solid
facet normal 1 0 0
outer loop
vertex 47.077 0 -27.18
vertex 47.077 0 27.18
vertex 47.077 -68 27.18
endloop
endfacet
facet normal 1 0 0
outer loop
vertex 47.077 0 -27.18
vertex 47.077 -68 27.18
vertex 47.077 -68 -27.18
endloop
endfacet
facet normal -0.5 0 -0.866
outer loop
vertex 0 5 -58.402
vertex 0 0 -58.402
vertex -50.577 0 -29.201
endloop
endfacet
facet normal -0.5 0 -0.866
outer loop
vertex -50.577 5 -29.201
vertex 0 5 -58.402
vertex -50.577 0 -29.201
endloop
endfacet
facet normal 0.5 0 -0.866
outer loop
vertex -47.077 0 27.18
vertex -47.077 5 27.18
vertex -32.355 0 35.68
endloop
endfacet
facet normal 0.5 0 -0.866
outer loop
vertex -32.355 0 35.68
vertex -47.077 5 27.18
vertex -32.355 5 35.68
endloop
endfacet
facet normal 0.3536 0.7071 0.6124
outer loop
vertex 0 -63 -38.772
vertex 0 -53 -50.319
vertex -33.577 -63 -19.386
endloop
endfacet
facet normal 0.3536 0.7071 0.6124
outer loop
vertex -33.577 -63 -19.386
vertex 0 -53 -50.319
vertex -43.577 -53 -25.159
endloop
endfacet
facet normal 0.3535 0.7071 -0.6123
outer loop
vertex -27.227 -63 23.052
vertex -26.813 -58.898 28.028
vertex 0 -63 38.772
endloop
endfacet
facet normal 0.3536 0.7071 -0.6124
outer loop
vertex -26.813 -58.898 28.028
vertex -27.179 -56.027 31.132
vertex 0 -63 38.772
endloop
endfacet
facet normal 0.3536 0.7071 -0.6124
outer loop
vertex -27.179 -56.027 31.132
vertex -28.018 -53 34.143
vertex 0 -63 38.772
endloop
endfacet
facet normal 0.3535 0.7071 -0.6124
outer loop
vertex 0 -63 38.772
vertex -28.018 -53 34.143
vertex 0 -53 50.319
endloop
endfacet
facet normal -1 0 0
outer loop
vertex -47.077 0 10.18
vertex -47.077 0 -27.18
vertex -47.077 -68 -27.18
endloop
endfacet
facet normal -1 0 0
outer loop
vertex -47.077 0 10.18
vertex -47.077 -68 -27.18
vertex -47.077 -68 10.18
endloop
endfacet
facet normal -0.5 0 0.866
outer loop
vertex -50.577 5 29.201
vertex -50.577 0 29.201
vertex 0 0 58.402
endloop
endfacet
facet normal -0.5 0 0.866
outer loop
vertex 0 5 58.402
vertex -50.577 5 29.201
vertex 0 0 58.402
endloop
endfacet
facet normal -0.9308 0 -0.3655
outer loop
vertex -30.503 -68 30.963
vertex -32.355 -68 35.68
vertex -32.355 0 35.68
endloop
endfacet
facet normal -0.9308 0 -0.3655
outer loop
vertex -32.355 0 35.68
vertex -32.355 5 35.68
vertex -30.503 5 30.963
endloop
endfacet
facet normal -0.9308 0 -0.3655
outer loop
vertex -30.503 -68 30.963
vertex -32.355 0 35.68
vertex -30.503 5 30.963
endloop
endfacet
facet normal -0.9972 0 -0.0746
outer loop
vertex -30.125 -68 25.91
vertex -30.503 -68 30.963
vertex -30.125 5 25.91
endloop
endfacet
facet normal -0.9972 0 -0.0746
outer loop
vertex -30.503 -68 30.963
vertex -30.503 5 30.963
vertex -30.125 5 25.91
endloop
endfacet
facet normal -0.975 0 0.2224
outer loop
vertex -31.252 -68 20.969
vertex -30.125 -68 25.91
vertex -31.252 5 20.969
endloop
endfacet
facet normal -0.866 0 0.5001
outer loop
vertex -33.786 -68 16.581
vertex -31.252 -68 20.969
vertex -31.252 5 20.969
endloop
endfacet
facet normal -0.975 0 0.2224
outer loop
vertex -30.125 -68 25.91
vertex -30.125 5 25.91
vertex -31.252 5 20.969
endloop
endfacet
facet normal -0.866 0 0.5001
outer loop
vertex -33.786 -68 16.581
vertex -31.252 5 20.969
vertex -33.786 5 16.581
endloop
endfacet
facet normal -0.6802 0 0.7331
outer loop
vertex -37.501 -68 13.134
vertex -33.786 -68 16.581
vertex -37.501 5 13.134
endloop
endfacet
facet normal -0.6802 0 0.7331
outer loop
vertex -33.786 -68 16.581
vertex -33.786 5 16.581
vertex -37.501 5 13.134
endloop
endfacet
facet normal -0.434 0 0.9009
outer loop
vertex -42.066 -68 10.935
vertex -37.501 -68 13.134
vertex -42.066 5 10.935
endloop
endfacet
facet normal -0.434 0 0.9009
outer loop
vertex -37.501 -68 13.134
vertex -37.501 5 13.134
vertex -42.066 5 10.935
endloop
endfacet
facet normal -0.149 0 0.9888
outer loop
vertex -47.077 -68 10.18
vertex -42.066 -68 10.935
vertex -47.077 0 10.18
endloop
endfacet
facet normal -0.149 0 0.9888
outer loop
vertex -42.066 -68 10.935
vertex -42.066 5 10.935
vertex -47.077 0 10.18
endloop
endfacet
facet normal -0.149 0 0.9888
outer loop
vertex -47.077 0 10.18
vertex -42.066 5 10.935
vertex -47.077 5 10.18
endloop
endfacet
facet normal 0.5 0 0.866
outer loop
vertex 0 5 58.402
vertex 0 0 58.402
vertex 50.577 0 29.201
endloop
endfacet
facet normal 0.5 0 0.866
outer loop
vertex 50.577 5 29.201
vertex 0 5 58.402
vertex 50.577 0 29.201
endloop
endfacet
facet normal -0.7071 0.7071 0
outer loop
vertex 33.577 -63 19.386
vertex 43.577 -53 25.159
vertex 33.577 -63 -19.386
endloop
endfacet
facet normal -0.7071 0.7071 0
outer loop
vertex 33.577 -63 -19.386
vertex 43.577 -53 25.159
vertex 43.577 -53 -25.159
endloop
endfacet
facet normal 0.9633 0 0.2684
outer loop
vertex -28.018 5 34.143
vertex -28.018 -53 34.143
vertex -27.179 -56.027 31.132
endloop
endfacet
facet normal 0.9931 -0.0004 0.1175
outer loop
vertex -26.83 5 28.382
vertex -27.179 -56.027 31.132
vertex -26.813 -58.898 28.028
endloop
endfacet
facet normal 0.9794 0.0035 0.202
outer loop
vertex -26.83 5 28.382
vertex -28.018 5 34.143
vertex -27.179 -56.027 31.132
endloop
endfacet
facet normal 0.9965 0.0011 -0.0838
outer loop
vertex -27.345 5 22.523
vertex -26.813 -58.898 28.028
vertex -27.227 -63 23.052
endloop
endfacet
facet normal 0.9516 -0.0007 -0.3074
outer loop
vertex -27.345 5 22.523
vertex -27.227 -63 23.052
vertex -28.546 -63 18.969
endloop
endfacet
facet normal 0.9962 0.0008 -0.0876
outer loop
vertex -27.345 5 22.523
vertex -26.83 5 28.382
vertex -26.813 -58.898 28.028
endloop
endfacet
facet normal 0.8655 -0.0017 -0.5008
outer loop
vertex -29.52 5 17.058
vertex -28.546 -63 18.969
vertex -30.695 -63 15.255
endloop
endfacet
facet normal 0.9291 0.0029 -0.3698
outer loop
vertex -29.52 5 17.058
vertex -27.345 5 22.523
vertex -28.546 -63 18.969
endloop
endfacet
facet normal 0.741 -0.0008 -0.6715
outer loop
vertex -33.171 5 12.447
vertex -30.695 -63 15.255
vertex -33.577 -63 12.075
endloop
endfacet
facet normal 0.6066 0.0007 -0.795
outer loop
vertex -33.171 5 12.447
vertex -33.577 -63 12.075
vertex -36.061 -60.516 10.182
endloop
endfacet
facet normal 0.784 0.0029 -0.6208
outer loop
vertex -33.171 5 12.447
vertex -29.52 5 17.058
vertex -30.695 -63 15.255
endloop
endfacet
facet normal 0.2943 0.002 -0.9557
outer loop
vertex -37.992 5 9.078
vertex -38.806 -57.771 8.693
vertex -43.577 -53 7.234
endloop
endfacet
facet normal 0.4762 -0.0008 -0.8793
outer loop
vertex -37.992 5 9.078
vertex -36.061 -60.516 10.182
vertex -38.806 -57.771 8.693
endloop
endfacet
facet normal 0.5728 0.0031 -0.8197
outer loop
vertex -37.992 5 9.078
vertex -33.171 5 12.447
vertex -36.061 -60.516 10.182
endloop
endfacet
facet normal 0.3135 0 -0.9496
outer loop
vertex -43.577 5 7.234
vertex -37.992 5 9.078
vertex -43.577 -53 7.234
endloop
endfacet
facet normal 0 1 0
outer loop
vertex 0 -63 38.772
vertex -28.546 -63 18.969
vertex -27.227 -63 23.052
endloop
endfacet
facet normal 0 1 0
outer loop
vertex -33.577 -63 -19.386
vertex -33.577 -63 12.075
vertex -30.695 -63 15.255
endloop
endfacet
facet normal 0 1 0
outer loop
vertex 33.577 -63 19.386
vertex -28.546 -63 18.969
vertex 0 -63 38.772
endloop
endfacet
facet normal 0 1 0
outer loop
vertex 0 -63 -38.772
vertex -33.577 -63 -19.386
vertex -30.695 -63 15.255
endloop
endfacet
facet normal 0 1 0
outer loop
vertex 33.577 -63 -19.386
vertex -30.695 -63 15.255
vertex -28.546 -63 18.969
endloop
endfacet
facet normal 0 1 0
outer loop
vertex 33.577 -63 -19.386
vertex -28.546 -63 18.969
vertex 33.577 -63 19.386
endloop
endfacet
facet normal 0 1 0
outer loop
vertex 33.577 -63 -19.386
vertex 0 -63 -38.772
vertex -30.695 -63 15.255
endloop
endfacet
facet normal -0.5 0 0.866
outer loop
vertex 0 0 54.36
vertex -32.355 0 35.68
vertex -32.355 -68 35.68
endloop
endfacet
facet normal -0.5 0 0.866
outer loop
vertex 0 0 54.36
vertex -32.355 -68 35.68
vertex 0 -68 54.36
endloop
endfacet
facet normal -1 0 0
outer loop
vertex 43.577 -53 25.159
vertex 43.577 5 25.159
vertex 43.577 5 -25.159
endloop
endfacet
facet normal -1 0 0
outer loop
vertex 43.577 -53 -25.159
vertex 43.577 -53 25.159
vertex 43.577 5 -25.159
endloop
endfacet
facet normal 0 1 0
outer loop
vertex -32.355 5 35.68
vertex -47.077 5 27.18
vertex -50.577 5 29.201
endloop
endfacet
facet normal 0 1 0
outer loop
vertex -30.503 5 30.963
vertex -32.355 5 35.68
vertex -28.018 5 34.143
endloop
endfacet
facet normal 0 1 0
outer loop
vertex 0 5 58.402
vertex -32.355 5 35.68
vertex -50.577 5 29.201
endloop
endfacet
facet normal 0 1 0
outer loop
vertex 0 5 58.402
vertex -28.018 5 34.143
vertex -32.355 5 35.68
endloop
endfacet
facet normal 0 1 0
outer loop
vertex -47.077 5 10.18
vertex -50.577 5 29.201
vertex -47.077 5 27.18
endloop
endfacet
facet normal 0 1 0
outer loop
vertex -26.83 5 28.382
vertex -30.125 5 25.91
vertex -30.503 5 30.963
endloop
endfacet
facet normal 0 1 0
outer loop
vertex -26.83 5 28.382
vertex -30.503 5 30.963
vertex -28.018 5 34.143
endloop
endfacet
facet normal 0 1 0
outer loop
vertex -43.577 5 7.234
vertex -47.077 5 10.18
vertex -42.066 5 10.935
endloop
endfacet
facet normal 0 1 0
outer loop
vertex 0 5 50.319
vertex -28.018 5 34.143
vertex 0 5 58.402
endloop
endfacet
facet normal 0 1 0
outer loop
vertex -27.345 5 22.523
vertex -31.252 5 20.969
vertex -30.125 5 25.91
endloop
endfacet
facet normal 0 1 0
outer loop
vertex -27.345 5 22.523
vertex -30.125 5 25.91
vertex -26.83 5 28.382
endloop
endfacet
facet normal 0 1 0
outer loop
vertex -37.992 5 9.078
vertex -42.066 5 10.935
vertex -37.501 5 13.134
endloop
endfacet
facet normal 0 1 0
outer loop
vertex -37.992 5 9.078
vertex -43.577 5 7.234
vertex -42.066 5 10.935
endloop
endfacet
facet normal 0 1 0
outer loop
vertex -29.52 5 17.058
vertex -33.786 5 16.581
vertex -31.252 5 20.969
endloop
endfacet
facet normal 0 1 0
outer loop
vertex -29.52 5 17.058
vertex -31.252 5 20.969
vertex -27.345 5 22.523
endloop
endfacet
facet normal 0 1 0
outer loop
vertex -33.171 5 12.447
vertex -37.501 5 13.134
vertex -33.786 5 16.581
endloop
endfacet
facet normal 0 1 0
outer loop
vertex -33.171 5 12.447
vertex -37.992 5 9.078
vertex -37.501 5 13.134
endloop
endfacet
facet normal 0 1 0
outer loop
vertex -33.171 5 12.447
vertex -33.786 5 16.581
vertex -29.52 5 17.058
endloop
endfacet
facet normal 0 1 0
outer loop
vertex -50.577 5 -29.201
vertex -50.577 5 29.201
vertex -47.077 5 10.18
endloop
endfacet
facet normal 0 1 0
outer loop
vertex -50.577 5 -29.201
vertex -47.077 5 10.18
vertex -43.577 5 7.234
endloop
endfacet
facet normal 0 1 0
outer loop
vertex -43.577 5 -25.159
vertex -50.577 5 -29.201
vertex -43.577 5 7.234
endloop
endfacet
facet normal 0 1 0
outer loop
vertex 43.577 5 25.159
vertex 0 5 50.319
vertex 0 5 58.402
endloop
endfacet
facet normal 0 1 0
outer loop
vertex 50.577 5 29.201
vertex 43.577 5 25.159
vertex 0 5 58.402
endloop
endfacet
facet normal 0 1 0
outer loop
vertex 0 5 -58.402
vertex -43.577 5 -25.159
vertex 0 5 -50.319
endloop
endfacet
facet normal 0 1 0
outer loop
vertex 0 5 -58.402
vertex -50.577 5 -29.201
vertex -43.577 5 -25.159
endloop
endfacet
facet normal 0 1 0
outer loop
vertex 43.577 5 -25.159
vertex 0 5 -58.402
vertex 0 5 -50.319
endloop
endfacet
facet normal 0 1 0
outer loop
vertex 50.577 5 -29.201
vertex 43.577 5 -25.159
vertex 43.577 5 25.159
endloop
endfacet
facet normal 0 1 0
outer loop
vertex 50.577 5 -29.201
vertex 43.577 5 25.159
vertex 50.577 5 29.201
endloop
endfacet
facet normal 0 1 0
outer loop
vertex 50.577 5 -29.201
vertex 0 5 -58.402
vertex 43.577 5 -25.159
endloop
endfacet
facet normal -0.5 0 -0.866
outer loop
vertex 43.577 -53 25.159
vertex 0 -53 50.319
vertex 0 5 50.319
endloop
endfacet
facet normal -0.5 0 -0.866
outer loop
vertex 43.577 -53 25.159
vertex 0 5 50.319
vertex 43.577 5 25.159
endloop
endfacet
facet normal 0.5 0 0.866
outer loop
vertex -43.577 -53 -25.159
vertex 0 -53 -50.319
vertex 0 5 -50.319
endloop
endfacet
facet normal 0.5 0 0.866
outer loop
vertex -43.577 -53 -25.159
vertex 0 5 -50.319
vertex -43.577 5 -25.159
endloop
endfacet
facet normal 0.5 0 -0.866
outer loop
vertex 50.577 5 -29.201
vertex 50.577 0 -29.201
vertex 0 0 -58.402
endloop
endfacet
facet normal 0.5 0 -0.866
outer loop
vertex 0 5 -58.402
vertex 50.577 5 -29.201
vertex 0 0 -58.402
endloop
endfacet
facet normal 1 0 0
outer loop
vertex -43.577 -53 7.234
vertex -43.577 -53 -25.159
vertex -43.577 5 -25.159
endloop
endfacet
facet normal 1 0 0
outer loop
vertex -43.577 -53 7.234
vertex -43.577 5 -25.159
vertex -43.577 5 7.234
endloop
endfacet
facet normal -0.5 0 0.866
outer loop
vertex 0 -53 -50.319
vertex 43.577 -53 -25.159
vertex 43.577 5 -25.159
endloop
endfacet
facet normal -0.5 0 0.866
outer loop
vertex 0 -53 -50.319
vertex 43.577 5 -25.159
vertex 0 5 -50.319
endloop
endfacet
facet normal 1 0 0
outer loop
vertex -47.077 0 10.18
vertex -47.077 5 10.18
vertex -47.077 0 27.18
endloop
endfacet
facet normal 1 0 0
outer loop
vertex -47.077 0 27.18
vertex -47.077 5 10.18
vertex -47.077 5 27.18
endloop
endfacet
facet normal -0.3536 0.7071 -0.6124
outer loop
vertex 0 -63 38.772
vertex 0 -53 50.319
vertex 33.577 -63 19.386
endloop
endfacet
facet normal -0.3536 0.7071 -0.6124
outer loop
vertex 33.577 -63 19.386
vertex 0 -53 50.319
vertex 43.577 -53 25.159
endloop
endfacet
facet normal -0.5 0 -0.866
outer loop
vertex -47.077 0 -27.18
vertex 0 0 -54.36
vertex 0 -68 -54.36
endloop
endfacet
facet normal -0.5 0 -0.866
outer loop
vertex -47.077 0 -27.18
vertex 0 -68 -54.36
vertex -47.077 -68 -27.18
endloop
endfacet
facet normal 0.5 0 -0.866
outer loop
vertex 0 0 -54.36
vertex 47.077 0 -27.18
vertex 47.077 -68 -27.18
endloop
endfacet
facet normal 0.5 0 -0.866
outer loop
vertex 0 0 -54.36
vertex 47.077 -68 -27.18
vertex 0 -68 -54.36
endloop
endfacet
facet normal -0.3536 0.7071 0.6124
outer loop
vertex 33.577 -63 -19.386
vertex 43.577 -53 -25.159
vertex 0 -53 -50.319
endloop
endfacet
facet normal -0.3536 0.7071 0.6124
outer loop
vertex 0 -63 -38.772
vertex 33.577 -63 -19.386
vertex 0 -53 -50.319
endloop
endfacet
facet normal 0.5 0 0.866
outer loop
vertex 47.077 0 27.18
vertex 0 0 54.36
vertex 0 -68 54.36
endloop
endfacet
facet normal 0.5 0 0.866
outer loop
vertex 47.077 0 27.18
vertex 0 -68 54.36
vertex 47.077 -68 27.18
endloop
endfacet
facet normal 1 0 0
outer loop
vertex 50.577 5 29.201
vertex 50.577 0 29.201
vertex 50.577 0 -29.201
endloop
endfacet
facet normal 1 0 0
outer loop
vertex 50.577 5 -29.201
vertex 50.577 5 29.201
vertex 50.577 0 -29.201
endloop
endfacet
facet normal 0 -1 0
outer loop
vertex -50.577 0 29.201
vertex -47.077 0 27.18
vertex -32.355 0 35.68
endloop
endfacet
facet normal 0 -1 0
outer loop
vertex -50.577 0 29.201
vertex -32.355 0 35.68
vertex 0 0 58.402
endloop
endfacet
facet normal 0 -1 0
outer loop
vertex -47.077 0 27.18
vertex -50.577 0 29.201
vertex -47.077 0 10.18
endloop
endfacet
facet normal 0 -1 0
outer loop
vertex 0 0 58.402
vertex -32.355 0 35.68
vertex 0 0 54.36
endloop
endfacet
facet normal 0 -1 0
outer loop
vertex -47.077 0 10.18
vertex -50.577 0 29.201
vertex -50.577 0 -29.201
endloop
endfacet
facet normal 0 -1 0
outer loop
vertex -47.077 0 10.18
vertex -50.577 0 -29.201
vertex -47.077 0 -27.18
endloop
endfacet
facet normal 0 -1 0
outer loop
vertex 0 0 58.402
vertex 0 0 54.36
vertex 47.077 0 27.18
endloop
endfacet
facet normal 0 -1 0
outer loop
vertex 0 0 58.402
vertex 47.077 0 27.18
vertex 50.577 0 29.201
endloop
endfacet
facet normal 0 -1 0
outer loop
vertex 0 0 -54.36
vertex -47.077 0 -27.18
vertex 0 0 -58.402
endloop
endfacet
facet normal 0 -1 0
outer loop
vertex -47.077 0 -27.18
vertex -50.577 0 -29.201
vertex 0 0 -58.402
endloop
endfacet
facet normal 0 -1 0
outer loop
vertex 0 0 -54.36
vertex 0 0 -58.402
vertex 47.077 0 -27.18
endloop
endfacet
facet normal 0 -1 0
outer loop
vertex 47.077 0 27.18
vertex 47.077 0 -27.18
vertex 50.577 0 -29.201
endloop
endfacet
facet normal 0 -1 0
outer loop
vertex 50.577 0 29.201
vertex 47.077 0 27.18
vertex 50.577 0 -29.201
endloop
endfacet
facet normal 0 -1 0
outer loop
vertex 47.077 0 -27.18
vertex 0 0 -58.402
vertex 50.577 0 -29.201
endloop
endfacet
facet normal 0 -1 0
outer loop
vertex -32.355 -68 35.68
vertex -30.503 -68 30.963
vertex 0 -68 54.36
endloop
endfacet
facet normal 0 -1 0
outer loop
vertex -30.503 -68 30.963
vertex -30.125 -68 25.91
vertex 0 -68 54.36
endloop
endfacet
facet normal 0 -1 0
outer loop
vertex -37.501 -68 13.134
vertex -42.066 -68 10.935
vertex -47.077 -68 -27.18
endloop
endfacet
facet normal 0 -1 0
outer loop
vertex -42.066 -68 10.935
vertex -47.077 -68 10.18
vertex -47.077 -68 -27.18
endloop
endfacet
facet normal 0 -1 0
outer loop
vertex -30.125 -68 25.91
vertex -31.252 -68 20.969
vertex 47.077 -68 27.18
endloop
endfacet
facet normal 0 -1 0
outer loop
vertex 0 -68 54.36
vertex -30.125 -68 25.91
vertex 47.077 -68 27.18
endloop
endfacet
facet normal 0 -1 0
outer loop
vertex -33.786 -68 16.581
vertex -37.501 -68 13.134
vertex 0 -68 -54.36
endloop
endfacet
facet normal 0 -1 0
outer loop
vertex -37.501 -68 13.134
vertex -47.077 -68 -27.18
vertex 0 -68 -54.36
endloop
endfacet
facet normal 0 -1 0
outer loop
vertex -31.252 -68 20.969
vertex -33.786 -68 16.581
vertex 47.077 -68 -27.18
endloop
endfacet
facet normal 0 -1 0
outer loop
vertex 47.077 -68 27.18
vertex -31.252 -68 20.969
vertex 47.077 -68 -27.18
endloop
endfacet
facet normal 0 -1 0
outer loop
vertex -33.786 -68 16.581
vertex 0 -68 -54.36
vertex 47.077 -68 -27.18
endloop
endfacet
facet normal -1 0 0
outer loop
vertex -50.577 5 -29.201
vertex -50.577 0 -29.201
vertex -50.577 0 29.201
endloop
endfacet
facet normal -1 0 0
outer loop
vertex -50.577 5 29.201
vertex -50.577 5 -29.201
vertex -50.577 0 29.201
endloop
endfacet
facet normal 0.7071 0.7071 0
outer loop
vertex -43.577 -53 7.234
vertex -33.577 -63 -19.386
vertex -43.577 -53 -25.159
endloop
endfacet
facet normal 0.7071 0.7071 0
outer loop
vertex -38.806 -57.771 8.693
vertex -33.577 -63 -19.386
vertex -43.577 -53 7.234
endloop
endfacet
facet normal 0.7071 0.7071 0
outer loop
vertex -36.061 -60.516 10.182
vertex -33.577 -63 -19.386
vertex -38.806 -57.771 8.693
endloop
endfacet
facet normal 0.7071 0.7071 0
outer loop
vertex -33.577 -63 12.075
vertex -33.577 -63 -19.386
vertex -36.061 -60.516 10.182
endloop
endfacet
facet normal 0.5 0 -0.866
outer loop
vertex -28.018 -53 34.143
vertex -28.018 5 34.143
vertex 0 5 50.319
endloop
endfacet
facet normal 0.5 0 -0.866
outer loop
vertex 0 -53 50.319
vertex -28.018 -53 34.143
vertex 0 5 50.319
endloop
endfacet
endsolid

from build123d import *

# Parameters (mm, degrees)
BOSS_EXTRUDE1_DEPTH = 5
BOSS_EXTRUDE2_DEPTH = 73
CUT_EXTRUDE1_DEPTH  = 68
BOSS_EXTRUDE3_DEPTH = 73
CUT_EXTRUDE3_DEPTH  = 73
CHAMFER1_SIZE       = 10


with BuildPart() as part:
    # Sketch3 → Boss-Extrude1 (new body)
    with BuildSketch(Plane(origin=(0, 0, 0), x_dir=(1, 0, 0), z_dir=(0, 1, 0))):
        Polygon((50.577269222, -29.2008), (50.577269222, 29.2008), (0, 58.4016), (-50.577269222, 29.2008), (-50.577269222, -29.2008), (0, -58.4016), align=None)
        Polygon((43.577269222, -25.159348116), (43.577269222, 25.159348116), (0, 50.318696231), (-43.577269222, 25.159348116), (-43.577269222, -25.159348116), (0, -50.318696231), align=None, mode=Mode.SUBTRACT)
    extrude(amount=BOSS_EXTRUDE1_DEPTH)

    # Sketch4 → Boss-Extrude2 (add)
    with BuildSketch(Plane(origin=(0, 5, 0), x_dir=(1, 0, 0), z_dir=(0, 1, 0))):
        Polygon((47.077269222, -27.180074058), (47.077269222, 27.180074058), (0, 54.360148116), (-47.077269222, 27.180074058), (-47.077269222, -27.180074058), (0, -54.360148116), align=None)
    extrude(amount=-BOSS_EXTRUDE2_DEPTH)

    # Sketch5 → Cut-Extrude1 (cut)
    with BuildSketch(Plane(origin=(0, 5, 0), x_dir=(1, 0, 0), z_dir=(0, 1, 0))):
        Polygon((43.577269222, -25.159348116), (43.577269222, 25.159348116), (0, 50.318696231), (-43.577269222, 25.159348116), (-43.577269222, -25.159348116), (0, -50.318696231), align=None)
    extrude(amount=-CUT_EXTRUDE1_DEPTH, mode=Mode.SUBTRACT)

    # Sketch6 → Boss-Extrude3 (add)
    with BuildSketch(Plane(origin=(0, 5, 0), x_dir=(1, 0, 0), z_dir=(0, 1, 0))):
        with BuildLine():
            ThreePointArc((-28.017982948, -34.142506234), (-29.520182072, -17.058341723), (-43.577269222, -7.233700248))
            Line((-43.577269222, -7.233700248), (-43.577269222, -25.159348116))
            Line((-43.577269222, -25.159348116), (-28.017982948, -34.142506234))
        make_face()
    extrude(amount=-BOSS_EXTRUDE3_DEPTH)

    # Sketch9 → Cut-Extrude3 (cut)
    with BuildSketch(Plane(origin=(0, 5, 0), x_dir=(1, 0, 0), z_dir=(0, 1, 0))):
        with BuildLine():
            Line((-47.077269222, -10.180074058), (-47.077269222, -27.180074058))
            Line((-47.077269222, -27.180074058), (-32.354837357, -35.680074058))
            ThreePointArc((-32.354837357, -35.680074058), (-32.354837357, -18.680074058), (-47.077269222, -10.180074058))
        make_face()
    extrude(amount=-CUT_EXTRUDE3_DEPTH, mode=Mode.SUBTRACT)

    # Chamfer1
    chamfer1_edges = [part.edges().sort_by_distance(p)[0] for p in [
        (21.788634611, -63, 37.739022174),
        (-43.577269222, -63, -8.962823934),
        (-21.788634611, -63, -37.739022174),
        (21.788634611, -63, -37.739022174),
        (43.577269222, -63, 0),
        (-14.008991474, -63, 42.230601233),
    ]]
    chamfer(chamfer1_edges, length=CHAMFER1_SIZE)


solid = part.part
